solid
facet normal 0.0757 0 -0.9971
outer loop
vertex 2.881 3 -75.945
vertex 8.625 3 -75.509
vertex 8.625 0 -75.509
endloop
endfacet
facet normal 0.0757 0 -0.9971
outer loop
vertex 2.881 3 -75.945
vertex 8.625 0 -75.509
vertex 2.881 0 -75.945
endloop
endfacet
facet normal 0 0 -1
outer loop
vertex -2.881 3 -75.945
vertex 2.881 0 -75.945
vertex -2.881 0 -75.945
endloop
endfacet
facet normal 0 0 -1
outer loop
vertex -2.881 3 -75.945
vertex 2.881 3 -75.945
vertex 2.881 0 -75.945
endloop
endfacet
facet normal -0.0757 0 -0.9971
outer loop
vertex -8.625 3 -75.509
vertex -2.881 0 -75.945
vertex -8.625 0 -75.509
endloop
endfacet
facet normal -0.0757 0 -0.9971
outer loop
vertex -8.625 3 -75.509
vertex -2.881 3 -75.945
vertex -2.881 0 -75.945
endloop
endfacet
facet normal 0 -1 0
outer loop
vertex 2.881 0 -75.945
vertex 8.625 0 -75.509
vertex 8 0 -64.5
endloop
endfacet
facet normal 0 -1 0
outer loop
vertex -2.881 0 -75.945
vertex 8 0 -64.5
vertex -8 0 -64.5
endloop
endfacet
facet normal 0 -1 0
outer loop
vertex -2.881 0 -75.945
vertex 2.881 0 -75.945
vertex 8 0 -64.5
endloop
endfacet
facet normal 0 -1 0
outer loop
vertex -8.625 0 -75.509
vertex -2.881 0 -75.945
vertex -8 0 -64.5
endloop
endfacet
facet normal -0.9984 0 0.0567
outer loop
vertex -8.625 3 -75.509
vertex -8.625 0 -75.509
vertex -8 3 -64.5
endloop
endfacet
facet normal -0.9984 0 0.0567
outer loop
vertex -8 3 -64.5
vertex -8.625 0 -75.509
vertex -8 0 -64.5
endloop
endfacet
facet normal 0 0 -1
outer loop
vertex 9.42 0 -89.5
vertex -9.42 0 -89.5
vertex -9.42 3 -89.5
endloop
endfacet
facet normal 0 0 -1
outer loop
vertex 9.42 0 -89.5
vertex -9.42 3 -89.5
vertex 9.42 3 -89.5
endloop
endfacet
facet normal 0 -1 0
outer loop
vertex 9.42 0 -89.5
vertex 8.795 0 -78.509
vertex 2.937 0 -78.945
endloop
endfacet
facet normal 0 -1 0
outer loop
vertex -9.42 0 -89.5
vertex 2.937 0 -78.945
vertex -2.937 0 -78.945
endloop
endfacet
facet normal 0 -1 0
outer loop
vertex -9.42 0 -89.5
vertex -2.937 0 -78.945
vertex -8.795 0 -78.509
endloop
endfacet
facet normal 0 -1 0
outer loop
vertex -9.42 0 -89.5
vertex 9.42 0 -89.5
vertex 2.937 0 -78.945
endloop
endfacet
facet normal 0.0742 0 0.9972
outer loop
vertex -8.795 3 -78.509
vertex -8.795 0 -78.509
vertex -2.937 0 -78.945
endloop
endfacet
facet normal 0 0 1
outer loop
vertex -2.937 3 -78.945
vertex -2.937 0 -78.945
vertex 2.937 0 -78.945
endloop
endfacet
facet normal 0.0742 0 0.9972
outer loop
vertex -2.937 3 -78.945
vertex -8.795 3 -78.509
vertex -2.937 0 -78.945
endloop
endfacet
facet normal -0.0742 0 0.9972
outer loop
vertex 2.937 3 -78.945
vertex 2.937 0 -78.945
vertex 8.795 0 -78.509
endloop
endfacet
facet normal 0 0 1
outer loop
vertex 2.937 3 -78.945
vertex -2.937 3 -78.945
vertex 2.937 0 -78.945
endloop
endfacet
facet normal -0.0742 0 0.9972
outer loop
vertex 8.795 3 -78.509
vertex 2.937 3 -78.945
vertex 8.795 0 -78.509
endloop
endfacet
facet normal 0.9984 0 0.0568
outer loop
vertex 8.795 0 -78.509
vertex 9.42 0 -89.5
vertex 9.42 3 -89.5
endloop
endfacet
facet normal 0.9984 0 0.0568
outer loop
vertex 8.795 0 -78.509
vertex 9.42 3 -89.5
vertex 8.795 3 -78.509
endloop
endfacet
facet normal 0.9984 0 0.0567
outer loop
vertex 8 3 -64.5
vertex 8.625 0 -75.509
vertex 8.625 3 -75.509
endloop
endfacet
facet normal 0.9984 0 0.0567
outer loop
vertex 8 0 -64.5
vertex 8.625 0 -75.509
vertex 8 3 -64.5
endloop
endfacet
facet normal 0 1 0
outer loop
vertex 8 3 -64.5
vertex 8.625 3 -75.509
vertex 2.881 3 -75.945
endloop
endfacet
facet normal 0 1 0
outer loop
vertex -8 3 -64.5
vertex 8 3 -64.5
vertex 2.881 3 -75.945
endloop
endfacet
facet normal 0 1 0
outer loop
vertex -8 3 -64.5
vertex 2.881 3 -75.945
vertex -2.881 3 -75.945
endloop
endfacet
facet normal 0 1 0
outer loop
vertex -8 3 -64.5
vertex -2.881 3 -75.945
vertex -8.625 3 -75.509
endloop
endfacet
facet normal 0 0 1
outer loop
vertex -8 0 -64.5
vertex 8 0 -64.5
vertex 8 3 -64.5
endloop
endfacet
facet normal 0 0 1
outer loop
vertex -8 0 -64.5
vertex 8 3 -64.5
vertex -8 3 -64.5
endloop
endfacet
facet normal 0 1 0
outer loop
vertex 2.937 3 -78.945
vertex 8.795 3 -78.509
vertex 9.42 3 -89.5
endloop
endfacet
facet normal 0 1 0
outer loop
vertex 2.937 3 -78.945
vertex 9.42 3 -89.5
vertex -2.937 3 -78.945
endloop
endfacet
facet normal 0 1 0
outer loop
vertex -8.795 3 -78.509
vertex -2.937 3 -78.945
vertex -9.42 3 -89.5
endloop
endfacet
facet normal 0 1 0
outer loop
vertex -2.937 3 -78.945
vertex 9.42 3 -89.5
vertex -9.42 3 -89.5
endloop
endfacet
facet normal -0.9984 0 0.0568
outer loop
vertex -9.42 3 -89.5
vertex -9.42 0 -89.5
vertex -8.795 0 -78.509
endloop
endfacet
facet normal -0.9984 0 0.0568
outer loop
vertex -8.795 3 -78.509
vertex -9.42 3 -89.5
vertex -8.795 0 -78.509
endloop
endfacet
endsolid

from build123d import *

# Parameters (mm, degrees)
BOSS_EXTRUDE1_DEPTH     = 3
CUT_EXTRUDE1_DEPTH      = 1
CUT_EXTRUDE1_DEPTH_BACK = 4


with BuildPart() as part:
    # Sketch1 → Boss-Extrude1 (new body)
    with BuildSketch(Plane(origin=(0, 0, 0), x_dir=(1, 0, 0), z_dir=(0, 1, 0))):
        Polygon((-9.419602878, 89.5), (-8, 64.5), (0, 64.5), (0, 89.5), align=None)
    boss_extrude1 = extrude(amount=BOSS_EXTRUDE1_DEPTH)

    # Mirror1: Boss-Extrude1 across plane
    add(boss_extrude1.mirror(Plane(origin=(0, 0, 0), x_dir=(0, 0, 1), z_dir=(1, 0, 0))))

    # Sketch2 → Cut-Extrude1 (cut, two sides)
    with BuildSketch(Plane(origin=(0, 3, 0), x_dir=(1, 0, 0), z_dir=(0, 1, 0))) as cut_extrude1_sk:
        with BuildLine():
            Line((-8.625135555, 75.508986463), (-8.795480151, 78.508850004))
            ThreePointArc((-8.795480151, 78.508850004), (0, 79), (8.795480151, 78.508850004))
            Line((8.795480151, 78.508850004), (8.625135555, 75.508986463))
            ThreePointArc((8.625135555, 75.508986463), (0, 76), (-8.625135555, 75.508986463))
        make_face()
    extrude(amount=CUT_EXTRUDE1_DEPTH, mode=Mode.SUBTRACT)
    extrude(cut_extrude1_sk.sketch, amount=-CUT_EXTRUDE1_DEPTH_BACK, mode=Mode.SUBTRACT)


solid = part.part
